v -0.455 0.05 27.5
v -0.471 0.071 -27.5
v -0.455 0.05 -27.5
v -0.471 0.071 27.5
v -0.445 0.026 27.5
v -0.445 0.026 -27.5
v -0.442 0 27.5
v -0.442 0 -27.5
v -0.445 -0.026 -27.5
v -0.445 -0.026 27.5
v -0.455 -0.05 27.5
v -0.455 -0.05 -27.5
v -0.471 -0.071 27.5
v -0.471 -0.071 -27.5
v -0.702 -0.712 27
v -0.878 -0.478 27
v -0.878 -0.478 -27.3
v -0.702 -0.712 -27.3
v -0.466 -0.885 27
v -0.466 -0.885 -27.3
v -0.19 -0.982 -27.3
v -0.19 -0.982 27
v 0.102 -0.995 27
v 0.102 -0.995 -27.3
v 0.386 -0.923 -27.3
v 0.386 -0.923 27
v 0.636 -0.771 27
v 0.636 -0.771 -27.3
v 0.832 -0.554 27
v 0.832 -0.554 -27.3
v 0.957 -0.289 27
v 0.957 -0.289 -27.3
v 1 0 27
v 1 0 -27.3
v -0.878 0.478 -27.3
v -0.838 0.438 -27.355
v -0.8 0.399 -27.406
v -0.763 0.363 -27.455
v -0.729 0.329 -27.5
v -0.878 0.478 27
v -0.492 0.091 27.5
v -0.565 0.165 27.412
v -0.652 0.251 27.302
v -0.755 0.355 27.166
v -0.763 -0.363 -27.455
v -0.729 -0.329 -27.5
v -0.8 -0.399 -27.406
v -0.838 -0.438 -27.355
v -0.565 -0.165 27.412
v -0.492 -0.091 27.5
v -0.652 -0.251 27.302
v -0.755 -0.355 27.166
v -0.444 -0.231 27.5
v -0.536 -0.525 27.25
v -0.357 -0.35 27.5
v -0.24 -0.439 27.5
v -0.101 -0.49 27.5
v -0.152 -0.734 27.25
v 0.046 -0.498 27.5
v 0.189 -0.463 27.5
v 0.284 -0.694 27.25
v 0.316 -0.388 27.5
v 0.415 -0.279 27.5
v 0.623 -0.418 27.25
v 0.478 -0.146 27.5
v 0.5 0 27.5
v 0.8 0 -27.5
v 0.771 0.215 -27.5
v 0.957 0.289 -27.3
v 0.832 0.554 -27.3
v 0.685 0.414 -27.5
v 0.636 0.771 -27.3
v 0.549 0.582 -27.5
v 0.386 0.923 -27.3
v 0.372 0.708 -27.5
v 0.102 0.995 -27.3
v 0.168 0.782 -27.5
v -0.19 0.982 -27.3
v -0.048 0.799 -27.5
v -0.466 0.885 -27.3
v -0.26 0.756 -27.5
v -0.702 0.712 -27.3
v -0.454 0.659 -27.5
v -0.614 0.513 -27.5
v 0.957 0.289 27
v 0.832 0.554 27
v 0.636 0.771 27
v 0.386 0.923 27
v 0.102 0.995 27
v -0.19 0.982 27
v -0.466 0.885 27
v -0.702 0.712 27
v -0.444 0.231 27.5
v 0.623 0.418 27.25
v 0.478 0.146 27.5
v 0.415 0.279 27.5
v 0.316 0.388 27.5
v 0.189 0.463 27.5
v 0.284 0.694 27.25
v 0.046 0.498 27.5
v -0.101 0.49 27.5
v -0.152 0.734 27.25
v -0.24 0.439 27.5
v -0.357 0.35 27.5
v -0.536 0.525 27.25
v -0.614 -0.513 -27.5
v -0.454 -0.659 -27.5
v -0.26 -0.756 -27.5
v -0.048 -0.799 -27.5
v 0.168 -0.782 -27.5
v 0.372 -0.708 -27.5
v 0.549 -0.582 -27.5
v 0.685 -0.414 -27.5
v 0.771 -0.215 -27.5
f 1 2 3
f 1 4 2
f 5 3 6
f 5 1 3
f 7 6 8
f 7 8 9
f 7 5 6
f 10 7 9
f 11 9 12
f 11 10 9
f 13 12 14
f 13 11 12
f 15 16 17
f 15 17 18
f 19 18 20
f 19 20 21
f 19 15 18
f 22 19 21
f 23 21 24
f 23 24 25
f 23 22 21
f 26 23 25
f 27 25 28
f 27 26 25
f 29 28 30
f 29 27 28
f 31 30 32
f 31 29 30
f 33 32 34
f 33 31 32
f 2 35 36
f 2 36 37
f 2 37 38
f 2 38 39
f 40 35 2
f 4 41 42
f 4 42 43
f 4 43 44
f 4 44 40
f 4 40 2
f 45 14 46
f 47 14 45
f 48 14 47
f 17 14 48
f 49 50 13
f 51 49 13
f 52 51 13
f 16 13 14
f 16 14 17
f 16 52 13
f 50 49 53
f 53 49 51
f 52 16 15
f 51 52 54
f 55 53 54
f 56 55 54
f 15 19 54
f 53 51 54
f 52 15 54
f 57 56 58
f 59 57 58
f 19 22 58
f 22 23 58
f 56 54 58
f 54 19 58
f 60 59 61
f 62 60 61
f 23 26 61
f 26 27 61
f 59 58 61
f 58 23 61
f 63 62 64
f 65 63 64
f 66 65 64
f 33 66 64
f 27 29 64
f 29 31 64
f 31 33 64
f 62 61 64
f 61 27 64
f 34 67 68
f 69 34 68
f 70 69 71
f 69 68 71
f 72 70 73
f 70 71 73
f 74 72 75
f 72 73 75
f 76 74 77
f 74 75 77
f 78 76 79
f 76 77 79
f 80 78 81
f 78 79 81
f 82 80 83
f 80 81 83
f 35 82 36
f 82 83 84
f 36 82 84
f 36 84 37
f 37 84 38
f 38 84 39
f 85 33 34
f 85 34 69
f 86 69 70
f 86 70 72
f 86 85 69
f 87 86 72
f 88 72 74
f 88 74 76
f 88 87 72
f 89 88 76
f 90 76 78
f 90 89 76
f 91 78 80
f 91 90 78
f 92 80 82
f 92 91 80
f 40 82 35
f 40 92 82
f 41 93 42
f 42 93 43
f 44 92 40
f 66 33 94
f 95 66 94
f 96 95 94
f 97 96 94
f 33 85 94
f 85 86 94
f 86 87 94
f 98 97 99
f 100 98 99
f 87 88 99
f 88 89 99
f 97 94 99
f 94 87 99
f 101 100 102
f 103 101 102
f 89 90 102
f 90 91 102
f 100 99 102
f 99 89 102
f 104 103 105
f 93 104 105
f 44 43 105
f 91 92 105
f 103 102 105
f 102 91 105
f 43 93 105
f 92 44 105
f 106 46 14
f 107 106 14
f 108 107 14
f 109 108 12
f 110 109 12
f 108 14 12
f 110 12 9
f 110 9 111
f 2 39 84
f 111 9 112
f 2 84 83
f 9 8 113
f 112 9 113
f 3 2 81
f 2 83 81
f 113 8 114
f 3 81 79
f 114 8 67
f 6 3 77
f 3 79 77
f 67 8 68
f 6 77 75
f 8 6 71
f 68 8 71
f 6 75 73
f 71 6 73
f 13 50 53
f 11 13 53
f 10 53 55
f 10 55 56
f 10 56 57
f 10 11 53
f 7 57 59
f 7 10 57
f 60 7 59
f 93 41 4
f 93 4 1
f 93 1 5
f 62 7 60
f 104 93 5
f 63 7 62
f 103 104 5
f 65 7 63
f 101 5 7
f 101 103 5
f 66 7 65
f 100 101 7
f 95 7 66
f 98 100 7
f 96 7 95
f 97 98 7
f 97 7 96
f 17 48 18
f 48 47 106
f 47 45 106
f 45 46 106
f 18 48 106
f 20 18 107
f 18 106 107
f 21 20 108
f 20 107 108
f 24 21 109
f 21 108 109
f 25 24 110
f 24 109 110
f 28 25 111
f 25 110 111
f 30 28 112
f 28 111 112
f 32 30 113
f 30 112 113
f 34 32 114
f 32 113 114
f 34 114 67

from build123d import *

# Parameters (mm, degrees)
F1_DEPTH = 27.5
F2_SIZE  = 0.5
F3_SIZE  = 0.2


with BuildPart() as f1:
    # F0 (on Top) → F1 (new body, symmetric)
    with BuildSketch(Plane.XY):
        with BuildLine():
            ThreePointArc((-0.878281, -0.478145), (0.246697, -0.969093), (1, 0))
            ThreePointArc((1, 0), (0.246697, 0.969093), (-0.878281, 0.478145))
            Line((-0.878281, 0.478145), (-0.470847, 0.070711))
            ThreePointArc((-0.470847, 0.070711), (-0.441557, 0), (-0.470847, -0.070711))
            Line((-0.470847, -0.070711), (-0.878281, -0.478145))
        make_face()
    extrude(amount=F1_DEPTH, both=True)

    # F2
    f2_edges = [f1.edges().sort_by_distance(p)[0] for p in [
        (0.246697, 0.969093, 27.5),
        (0.246697, -0.969093, 27.5),
    ]]
    chamfer(f2_edges, length=F2_SIZE)

    # F3
    f3_edges = [f1.edges().sort_by_distance(p)[0] for p in [
        (0.246697, -0.969093, -27.5),
        (0.246697, 0.969093, -27.5),
    ]]
    chamfer(f3_edges, length=F3_SIZE)


solid = f1.part
